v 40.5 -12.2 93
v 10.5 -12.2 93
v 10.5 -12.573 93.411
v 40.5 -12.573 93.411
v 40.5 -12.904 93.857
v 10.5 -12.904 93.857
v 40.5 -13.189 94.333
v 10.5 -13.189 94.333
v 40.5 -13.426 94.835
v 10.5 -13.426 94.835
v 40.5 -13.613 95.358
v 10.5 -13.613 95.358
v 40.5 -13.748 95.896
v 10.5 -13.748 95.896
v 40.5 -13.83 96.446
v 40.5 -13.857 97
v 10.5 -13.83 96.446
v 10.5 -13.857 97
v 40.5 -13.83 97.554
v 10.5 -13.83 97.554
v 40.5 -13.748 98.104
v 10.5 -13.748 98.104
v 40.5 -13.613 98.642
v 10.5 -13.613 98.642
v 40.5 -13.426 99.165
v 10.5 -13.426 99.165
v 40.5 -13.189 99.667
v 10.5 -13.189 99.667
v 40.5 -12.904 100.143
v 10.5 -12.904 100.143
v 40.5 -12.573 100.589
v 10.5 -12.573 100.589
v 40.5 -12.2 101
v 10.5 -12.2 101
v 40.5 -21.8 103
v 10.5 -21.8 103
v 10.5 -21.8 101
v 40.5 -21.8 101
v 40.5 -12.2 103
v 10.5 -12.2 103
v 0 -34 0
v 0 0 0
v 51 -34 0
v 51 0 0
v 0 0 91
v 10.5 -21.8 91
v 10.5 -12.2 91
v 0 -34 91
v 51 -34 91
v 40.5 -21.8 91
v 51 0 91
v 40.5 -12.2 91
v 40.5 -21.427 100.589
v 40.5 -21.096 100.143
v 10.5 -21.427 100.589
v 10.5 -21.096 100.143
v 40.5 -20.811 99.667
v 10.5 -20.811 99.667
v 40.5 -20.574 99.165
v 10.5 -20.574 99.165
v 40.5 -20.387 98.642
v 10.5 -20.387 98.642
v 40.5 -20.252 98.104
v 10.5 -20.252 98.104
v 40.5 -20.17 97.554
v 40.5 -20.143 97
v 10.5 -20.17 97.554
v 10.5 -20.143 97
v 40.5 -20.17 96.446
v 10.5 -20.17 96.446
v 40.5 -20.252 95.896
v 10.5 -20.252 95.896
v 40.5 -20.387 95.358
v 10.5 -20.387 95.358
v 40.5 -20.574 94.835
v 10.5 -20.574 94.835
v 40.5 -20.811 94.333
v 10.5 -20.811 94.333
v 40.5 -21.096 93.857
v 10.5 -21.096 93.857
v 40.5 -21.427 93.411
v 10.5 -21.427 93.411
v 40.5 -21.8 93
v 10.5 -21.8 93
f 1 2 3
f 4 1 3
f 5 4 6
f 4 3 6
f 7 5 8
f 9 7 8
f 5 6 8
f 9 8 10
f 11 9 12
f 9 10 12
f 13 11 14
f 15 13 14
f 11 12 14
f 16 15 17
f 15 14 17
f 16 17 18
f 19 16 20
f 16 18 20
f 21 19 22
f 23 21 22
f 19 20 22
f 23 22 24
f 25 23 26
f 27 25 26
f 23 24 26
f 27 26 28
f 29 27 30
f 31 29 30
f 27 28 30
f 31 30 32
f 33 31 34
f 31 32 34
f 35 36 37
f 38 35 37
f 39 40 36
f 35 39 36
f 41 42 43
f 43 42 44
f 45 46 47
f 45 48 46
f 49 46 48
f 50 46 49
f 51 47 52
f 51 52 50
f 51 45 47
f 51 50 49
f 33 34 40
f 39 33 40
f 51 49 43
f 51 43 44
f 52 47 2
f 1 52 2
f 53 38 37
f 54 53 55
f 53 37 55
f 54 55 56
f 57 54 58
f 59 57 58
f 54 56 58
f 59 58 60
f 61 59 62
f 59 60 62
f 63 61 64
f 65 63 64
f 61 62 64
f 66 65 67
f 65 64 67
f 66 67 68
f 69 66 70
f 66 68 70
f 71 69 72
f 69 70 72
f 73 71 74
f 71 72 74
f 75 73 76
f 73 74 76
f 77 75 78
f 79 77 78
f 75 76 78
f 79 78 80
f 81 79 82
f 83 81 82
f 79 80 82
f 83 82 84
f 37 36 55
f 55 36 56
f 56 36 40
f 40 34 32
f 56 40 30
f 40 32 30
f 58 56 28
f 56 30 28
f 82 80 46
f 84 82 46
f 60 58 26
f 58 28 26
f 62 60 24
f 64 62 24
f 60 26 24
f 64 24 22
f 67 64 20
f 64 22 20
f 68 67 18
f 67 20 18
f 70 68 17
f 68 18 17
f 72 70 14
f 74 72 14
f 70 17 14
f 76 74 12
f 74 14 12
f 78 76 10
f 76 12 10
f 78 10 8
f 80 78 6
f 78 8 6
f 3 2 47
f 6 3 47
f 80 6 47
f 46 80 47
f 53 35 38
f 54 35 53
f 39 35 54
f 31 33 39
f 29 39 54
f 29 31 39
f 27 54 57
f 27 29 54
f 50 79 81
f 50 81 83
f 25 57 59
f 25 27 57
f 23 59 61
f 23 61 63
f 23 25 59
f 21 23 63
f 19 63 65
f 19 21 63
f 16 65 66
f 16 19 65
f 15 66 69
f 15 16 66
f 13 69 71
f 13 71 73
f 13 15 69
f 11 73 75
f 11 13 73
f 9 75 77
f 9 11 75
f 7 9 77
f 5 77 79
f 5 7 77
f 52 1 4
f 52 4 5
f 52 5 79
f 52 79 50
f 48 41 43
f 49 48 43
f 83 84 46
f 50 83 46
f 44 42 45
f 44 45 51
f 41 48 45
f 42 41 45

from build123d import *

# Parameters (mm, degrees)
SKETCH1_W           = 51
SKETCH1_H           = 34
BOSS_EXTRUDE1_DEPTH = 91
SKETCH2_W           = 30
SKETCH2_H           = 6
BOSS_EXTRUDE2_DEPTH = 12
BOSS_EXTRUDE3_DEPTH = 30


with BuildPart() as part:
    # Sketch1 → Boss-Extrude1 (new body)
    with BuildSketch(Plane.XY):
        with Locations((25.5, -17)):
            Rectangle(SKETCH1_W, SKETCH1_H)
    extrude(amount=BOSS_EXTRUDE1_DEPTH)

    # Sketch2 → Boss-Extrude2 (add)
    with BuildSketch(Plane.XY.offset(91)):
        with Locations((25.5, -17)):
            Rectangle(SKETCH2_W, SKETCH2_H)
    extrude(amount=BOSS_EXTRUDE2_DEPTH)

    # Sketch3 → Boss-Extrude3 (add)
    with BuildSketch(Plane.ZY.offset(-10.5)):
        with BuildLine():
            Line((91, -12.2), (93, -12.2))
            ThreePointArc((93, -12.2), (97, -13.856854249), (101, -12.2))
            Line((101, -12.2), (103, -12.2))
            Line((103, -12.2), (103, -14))
            Line((103, -14), (91, -14))
            Line((91, -14), (91, -12.2))
        make_face()
        with BuildLine():
            Line((103, -20), (103, -21.8))
            Line((103, -21.8), (101, -21.8))
            ThreePointArc((101, -21.8), (97, -20.143145751), (93, -21.8))
            Line((93, -21.8), (91, -21.8))
            Line((91, -21.8), (91, -20))
            Line((91, -20), (103, -20))
        make_face()
    extrude(amount=-BOSS_EXTRUDE3_DEPTH)


solid = part.part
